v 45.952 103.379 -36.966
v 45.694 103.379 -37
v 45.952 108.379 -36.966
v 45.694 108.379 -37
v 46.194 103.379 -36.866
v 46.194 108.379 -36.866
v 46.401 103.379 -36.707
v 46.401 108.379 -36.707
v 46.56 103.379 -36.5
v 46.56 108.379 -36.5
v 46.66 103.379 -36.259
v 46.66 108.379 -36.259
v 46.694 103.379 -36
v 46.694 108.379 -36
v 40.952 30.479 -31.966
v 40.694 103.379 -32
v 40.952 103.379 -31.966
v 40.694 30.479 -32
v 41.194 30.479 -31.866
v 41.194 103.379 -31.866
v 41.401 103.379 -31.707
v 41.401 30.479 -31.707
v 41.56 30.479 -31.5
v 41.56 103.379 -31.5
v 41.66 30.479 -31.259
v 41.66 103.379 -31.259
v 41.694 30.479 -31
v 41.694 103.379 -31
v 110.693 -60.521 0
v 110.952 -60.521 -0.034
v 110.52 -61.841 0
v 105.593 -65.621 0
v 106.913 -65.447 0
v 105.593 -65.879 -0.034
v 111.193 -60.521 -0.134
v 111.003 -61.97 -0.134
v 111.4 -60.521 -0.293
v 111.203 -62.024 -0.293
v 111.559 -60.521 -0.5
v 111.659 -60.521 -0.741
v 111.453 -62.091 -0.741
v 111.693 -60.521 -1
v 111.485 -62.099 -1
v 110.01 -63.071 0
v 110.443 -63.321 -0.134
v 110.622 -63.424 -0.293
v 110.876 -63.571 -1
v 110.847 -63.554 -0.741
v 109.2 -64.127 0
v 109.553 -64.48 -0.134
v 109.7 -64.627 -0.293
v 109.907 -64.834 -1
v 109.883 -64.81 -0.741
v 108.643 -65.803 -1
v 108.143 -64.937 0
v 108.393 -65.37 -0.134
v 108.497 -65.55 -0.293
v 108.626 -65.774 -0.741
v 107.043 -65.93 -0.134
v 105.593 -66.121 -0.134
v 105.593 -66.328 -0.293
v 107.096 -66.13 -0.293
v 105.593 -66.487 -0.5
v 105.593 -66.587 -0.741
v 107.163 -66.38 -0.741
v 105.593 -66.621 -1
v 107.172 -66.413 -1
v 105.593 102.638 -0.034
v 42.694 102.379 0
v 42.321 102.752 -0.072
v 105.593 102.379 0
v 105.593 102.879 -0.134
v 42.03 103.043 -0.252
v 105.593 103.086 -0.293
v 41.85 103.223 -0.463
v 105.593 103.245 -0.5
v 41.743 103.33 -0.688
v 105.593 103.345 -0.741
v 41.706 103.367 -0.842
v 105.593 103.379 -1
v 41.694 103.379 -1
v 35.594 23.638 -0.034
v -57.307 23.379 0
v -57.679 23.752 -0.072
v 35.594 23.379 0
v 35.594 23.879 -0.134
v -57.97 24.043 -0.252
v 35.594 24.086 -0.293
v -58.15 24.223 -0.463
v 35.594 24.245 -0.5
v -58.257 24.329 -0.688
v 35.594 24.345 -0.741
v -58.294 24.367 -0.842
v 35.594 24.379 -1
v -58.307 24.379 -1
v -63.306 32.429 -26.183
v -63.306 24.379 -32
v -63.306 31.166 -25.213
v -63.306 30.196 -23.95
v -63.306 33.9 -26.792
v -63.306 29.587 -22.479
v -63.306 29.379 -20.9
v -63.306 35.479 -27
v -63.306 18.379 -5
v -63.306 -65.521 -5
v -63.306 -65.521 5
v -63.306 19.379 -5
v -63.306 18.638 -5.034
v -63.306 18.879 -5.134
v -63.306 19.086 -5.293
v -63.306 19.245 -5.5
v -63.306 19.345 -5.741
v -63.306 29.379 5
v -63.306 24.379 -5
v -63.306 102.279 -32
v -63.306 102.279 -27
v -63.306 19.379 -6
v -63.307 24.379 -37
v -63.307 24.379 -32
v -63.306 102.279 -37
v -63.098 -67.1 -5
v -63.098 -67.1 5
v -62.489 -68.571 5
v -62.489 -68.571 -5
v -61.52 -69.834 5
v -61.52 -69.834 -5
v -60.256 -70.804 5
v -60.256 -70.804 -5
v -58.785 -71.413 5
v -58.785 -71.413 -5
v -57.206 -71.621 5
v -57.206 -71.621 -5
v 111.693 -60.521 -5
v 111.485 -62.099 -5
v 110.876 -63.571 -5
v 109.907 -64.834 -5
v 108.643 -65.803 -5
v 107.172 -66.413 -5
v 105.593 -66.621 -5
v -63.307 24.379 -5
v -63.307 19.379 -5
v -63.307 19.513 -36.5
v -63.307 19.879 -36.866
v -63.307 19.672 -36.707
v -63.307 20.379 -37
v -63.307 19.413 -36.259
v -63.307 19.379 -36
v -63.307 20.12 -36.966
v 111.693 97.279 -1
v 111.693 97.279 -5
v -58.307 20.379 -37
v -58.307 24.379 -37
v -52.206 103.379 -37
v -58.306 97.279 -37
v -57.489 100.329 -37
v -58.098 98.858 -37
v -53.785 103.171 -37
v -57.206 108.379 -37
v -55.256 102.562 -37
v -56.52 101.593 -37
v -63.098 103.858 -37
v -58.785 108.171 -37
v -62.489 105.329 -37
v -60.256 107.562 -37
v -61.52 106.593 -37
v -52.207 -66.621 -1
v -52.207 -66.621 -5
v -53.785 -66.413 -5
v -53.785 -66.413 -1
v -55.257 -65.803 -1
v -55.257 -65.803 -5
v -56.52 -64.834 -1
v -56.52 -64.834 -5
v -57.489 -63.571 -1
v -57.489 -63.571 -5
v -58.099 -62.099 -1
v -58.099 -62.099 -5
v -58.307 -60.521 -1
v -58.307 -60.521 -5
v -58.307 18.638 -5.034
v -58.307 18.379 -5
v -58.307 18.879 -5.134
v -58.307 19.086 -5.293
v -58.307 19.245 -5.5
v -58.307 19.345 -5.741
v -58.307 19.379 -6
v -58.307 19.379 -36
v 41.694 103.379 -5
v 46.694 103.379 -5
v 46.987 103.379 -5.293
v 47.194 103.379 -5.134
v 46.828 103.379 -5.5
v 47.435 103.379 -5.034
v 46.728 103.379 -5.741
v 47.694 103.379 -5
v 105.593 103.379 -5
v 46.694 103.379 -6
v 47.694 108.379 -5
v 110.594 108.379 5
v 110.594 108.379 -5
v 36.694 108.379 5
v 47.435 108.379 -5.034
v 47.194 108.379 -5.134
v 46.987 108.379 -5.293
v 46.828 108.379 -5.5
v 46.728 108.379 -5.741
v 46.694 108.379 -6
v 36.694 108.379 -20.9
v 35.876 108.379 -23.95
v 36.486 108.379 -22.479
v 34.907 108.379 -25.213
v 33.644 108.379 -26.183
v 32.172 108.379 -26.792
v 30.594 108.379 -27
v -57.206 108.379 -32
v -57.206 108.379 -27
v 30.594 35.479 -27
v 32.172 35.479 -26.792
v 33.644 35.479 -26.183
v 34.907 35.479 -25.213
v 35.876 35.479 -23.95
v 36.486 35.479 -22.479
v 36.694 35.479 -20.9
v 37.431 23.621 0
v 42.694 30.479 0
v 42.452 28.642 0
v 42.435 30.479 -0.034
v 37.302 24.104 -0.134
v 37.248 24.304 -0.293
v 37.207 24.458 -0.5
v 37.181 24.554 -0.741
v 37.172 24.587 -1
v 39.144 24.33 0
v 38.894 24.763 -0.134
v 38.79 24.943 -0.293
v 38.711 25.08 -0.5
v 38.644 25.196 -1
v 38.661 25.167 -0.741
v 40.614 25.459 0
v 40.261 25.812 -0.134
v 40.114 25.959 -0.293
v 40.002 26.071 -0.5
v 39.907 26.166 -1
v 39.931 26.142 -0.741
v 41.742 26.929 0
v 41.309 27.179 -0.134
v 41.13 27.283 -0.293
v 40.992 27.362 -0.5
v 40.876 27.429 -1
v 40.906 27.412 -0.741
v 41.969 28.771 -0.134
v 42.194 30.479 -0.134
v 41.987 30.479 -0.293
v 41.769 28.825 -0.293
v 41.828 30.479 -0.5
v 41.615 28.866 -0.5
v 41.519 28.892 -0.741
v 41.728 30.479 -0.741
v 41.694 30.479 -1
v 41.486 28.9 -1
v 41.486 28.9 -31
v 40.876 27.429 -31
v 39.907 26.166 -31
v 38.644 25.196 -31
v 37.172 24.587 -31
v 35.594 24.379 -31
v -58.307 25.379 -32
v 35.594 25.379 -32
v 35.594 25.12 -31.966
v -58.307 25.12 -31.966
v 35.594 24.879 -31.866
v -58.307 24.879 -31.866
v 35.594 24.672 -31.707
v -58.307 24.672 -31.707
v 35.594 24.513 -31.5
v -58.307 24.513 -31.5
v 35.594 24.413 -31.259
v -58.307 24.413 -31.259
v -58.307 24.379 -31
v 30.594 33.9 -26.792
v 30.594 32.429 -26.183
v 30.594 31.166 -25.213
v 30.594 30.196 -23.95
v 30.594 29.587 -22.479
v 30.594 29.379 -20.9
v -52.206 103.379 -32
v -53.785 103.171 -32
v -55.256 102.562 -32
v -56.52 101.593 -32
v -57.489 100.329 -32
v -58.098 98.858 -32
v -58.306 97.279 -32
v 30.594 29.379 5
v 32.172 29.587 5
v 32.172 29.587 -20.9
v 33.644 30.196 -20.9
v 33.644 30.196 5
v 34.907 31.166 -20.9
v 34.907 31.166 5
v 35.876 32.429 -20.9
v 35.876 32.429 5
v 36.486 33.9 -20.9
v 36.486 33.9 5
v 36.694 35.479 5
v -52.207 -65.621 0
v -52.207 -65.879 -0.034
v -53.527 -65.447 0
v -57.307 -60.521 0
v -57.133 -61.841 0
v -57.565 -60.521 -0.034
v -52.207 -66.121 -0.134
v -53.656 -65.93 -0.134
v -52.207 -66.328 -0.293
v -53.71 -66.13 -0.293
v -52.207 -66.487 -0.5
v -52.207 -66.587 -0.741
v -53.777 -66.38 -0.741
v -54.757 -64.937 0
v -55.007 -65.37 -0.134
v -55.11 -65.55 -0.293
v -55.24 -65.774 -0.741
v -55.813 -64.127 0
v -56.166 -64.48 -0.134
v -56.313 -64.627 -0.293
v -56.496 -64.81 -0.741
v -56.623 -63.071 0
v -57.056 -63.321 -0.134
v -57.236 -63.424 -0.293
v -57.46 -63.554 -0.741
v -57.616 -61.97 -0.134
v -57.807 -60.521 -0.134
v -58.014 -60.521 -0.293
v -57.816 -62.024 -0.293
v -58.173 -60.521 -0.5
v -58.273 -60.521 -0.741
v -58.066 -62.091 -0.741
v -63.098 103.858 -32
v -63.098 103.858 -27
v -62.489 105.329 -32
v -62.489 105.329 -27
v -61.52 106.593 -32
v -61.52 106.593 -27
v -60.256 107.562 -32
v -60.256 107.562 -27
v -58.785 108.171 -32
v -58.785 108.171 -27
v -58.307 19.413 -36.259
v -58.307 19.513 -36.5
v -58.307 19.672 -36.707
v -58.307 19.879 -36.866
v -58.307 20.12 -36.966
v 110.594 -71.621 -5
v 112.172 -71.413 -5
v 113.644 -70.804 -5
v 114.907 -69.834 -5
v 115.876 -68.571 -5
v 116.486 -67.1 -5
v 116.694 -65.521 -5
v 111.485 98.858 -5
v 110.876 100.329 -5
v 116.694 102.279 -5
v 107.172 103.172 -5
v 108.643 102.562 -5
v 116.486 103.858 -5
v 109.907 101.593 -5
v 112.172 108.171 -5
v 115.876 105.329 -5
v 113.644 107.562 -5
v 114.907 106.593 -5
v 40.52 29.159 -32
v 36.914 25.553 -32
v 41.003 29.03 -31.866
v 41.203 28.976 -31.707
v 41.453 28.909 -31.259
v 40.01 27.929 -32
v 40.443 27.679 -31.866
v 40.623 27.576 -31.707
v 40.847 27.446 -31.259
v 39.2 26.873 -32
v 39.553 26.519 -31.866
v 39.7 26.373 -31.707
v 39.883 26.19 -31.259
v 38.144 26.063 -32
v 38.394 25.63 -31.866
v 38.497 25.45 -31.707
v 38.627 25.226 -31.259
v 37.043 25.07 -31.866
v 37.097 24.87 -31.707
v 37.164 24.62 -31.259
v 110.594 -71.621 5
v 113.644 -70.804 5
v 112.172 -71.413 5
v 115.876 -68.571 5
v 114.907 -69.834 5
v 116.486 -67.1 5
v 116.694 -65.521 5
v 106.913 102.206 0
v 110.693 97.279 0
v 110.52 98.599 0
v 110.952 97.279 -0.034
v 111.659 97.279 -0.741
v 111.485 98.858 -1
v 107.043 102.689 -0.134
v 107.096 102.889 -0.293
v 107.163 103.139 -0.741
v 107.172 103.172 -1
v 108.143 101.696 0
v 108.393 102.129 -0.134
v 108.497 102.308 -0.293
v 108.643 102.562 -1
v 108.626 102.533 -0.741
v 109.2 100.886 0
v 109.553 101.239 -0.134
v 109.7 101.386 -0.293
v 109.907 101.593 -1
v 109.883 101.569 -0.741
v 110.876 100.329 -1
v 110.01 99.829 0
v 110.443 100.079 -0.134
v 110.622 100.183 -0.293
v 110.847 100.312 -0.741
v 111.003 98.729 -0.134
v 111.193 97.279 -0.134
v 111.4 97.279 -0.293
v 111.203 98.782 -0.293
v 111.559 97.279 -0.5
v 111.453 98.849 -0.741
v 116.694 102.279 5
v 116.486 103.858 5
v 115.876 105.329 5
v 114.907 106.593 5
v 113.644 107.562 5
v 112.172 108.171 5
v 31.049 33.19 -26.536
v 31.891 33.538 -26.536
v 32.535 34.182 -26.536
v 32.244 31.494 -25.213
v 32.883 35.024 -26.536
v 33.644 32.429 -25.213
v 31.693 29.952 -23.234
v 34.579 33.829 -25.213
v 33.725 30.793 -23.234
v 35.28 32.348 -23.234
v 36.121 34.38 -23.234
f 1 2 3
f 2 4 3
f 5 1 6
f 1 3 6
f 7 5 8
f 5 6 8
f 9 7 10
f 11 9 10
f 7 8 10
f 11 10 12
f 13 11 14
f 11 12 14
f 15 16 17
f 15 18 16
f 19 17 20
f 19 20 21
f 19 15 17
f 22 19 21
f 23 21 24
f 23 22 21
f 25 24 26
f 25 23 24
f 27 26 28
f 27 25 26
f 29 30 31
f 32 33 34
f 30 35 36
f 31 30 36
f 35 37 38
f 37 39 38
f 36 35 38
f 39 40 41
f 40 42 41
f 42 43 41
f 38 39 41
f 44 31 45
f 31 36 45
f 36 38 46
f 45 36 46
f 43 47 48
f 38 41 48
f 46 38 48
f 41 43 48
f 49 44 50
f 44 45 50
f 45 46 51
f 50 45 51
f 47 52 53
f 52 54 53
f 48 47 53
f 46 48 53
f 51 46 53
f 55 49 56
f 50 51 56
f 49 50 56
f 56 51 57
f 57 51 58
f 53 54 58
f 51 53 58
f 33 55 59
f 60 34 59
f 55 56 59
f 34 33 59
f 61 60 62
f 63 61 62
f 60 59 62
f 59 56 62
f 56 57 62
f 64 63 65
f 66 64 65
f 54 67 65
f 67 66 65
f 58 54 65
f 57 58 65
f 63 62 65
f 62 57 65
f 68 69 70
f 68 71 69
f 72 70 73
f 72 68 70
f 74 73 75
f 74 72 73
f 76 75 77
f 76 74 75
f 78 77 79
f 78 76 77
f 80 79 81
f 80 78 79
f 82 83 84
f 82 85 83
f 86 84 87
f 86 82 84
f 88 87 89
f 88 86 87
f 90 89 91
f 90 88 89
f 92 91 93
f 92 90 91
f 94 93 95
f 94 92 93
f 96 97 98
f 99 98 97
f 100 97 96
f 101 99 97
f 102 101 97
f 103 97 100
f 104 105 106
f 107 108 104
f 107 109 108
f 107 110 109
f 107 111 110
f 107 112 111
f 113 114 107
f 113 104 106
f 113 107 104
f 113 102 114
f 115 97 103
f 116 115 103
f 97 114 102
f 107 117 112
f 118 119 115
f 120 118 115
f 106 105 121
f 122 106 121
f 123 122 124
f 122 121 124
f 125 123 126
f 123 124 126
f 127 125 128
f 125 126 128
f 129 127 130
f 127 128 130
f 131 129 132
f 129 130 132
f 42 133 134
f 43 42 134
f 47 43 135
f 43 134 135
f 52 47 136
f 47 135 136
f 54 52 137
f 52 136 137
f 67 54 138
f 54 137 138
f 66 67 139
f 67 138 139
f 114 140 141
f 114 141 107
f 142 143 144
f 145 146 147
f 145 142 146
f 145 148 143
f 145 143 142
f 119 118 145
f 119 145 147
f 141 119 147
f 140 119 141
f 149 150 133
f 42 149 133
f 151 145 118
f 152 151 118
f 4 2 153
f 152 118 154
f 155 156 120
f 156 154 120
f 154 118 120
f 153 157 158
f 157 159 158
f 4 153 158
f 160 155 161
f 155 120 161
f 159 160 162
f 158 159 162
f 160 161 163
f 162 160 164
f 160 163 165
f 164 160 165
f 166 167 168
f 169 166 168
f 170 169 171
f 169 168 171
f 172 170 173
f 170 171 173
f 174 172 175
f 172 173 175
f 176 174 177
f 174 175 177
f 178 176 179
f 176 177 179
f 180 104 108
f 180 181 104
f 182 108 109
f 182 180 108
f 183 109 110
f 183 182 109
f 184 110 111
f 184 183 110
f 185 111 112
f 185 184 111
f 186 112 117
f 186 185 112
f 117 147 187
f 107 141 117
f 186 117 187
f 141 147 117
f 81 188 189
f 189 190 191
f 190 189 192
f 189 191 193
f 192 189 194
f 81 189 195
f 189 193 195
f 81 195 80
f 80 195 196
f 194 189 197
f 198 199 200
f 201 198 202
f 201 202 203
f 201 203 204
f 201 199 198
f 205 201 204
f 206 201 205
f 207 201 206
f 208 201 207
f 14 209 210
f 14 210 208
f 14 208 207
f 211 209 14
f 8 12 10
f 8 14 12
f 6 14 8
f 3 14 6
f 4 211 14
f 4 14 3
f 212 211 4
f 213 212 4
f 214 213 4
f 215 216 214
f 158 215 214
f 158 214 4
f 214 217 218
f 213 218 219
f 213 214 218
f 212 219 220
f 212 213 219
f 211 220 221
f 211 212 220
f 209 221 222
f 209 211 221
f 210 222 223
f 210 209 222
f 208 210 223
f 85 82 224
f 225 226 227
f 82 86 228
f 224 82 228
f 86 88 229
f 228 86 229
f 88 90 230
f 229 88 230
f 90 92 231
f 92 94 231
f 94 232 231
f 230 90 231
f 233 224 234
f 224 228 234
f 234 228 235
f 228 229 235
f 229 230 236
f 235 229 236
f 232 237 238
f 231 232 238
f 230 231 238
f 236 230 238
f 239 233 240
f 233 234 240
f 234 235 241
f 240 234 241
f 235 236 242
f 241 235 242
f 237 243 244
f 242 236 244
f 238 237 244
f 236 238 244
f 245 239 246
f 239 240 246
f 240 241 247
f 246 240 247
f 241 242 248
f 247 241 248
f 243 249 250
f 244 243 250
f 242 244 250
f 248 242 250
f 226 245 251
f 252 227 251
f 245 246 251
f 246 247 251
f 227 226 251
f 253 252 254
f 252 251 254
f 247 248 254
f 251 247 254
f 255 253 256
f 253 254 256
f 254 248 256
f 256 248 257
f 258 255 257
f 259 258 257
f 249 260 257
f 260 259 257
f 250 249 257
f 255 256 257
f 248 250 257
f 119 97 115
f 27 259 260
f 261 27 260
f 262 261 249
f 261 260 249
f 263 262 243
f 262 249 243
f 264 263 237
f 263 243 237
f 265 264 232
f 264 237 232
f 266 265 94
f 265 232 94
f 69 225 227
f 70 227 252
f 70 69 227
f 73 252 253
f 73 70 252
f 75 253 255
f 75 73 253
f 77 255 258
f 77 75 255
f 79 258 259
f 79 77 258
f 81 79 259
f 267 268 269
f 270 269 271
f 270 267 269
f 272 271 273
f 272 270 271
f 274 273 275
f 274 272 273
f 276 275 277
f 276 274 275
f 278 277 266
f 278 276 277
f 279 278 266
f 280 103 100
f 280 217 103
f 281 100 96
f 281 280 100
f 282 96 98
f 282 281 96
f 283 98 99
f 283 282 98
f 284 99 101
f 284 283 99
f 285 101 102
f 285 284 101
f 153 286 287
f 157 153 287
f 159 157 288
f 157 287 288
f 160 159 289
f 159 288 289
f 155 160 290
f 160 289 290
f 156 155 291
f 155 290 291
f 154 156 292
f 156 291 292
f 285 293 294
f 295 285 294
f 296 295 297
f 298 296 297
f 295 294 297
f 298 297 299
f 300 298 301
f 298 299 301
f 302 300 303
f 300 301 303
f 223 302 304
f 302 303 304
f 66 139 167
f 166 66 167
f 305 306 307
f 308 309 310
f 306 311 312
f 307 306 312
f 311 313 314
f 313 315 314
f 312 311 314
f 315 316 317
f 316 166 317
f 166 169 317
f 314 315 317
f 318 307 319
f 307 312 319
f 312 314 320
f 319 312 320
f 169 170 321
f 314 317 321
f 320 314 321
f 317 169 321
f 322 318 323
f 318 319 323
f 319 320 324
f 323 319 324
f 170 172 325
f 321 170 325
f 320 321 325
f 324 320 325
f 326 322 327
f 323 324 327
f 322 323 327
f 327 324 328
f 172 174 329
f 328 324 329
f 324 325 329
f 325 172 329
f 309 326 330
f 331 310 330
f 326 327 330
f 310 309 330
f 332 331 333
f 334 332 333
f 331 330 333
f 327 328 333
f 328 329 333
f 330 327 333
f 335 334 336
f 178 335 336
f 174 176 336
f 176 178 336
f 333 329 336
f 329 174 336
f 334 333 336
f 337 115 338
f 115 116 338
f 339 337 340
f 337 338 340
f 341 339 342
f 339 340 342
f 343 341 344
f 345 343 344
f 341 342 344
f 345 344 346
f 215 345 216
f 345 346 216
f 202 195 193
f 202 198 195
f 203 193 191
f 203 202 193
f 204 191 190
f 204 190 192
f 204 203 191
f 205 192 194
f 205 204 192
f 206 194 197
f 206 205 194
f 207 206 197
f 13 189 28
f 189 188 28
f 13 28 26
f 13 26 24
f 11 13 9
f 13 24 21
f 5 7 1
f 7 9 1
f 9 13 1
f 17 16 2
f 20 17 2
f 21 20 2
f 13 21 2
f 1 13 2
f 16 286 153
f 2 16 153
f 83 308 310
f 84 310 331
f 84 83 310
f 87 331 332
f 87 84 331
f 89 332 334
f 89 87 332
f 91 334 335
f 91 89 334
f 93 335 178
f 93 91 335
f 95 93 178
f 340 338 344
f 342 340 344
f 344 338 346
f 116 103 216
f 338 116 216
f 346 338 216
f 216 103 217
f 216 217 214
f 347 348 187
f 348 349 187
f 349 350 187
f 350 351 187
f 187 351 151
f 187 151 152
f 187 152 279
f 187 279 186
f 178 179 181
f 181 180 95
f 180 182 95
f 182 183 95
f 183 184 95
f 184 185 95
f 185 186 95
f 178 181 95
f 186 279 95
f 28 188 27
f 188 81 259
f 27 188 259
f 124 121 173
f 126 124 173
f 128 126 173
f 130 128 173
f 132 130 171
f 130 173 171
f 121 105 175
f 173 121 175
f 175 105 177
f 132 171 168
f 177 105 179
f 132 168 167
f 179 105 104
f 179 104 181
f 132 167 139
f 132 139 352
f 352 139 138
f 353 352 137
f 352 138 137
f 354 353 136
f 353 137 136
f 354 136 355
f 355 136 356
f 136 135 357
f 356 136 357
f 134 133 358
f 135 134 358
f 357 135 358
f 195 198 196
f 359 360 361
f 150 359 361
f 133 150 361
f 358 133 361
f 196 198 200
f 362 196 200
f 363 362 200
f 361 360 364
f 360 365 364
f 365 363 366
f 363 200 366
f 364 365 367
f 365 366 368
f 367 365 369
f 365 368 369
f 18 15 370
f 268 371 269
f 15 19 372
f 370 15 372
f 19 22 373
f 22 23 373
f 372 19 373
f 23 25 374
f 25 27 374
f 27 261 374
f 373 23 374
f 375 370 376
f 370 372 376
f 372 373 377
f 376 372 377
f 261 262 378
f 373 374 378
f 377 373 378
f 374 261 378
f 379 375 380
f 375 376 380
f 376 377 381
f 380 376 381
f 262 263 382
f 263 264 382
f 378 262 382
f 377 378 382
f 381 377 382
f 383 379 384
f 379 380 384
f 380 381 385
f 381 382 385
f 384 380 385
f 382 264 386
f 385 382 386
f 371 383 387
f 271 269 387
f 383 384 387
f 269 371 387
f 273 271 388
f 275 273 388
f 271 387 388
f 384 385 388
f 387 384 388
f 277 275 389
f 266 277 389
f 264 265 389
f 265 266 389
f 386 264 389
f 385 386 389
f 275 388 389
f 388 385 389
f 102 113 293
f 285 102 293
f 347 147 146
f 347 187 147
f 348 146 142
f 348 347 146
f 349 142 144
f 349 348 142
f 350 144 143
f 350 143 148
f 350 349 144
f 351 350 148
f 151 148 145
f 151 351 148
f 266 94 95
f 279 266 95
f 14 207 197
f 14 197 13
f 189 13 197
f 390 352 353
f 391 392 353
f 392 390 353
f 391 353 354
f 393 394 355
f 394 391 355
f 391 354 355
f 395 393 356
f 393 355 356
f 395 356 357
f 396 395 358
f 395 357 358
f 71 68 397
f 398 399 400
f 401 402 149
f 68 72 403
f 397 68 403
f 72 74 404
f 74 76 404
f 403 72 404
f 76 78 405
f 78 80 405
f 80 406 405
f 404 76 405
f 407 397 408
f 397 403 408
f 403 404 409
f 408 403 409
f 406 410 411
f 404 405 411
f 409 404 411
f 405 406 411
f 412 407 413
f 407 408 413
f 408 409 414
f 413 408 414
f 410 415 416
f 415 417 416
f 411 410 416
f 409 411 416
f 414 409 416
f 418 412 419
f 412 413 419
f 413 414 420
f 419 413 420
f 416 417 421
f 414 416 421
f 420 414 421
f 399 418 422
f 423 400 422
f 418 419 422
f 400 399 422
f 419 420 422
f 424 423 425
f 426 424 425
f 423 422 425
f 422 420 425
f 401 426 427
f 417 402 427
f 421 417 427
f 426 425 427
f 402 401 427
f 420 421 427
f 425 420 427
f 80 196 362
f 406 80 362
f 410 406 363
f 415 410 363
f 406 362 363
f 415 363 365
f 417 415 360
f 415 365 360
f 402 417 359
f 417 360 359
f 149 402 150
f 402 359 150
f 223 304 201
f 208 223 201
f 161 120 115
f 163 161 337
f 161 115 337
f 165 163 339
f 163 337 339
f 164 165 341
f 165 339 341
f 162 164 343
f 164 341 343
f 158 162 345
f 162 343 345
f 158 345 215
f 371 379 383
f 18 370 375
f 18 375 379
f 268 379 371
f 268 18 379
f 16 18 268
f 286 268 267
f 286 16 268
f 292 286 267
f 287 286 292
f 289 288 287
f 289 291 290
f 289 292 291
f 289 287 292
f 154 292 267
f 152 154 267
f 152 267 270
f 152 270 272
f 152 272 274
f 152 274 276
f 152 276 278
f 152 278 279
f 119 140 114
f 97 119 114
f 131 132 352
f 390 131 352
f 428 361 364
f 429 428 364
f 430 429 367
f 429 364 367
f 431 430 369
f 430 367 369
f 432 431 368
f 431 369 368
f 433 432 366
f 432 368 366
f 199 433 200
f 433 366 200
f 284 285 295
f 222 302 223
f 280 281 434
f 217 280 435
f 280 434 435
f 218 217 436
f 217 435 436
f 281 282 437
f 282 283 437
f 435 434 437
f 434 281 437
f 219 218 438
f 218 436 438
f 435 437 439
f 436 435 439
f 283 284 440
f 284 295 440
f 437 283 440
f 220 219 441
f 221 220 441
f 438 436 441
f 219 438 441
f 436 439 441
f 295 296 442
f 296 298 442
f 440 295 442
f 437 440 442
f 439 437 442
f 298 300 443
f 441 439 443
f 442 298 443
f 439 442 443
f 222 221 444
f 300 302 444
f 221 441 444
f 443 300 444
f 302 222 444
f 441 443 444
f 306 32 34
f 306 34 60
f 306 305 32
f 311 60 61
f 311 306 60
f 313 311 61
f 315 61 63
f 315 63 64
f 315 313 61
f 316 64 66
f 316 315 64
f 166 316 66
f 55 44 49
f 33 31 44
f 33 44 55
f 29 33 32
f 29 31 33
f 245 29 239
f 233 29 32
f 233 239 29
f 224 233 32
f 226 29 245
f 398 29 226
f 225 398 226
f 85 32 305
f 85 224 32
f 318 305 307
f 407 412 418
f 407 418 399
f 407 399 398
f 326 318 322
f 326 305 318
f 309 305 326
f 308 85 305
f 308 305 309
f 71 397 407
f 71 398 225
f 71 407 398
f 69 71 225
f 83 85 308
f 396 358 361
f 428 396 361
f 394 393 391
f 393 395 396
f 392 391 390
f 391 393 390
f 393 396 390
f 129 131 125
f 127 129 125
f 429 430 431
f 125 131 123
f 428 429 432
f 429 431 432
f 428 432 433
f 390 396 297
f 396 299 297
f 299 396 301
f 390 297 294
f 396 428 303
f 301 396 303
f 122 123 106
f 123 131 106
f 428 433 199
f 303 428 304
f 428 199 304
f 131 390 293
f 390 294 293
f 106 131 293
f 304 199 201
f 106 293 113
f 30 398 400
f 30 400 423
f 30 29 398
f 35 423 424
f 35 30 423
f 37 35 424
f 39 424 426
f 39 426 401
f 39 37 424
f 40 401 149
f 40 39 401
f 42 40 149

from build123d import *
from build123d.topology import SkipClean

# Parameters (mm, degrees)
BOSS_EXTRUDE1_DEPTH = 5
BOSS_EXTRUDE2_START = -10
BOSS_EXTRUDE2_DEPTH = 10
SKETCH4_W           = 100
SKETCH4_H           = 79
CUT_EXTRUDE1_DEPTH  = 30
BOSS_EXTRUDE3_DEPTH = 37
SKETCH8_W           = 5
SKETCH8_H           = 79
BOSS_EXTRUDE6_DEPTH = 100
FILLET3_R           = 6.1
FILLET4_R           = 6.1
BOSS_EXTRUDE7_DEPTH = 5
SKETCH10_W          = 5
SKETCH10_H          = 32
BOSS_EXTRUDE8_DEPTH = 5
SKETCH11_W          = 32
SKETCH11_H          = 5
BOSS_EXTRUDE9_DEPTH = 5
FILLET6_R           = 1


with BuildPart() as part:
    # Sketch1 → Boss-Extrude1 (new body)
    with BuildSketch(Plane.XY):
        with BuildLine():
            Line((-57.206320908, 108.379254457), (110.593679092, 108.379254457))
            ThreePointArc((110.593679092, 108.379254457), (114.907030458, 106.592605822), (116.693679092, 102.279254457))
            Line((116.693679092, 102.279254457), (116.693679092, -65.520745543))
            ThreePointArc((116.693679092, -65.520745543), (114.907030458, -69.834096908), (110.593679092, -71.620745543))
            Line((110.593679092, -71.620745543), (-57.206320908, -71.620745543))
            ThreePointArc((-57.206320908, -71.620745543), (-61.519672273, -69.834096908), (-63.306320908, -65.520745543))
            Line((-63.306320908, -65.520745543), (-63.306320908, 102.279254457))
            ThreePointArc((-63.306320908, 102.279254457), (-61.519672273, 106.592605822), (-57.206320908, 108.379254457))
        make_face()
    extrude(amount=BOSS_EXTRUDE1_DEPTH)

    # Sketch3 → Boss-Extrude2 (add)
    with SkipClean():  # the faces are left unmerged after this step: merging them gives an invalid solid
        with BuildSketch(Plane.XY.offset(5).offset(BOSS_EXTRUDE2_START)):
            with BuildLine():
                ThreePointArc((-57.206320908, 108.379254457), (-61.519672273, 106.592605822), (-63.306320908, 102.279254457))
                Line((-63.306320908, 102.279254457), (-63.306320908, -65.520745543))
                ThreePointArc((-63.306320908, -65.520745543), (-61.519672273, -69.834096908), (-57.206320908, -71.620745543))
                Line((-57.206320908, -71.620745543), (110.593679092, -71.620745543))
                ThreePointArc((110.593679092, -71.620745543), (114.907030458, -69.834096908), (116.693679092, -65.520745543))
                Line((116.693679092, -65.520745543), (116.693679092, 102.279254457))
                ThreePointArc((116.693679092, 102.279254457), (114.907030458, 106.592605822), (110.593679092, 108.379254457))
                Line((110.593679092, 108.379254457), (-57.206320908, 108.379254457))
            make_face()
            with BuildLine():
                Line((105.593338585, -66.620625471), (-52.206661415, -66.620625471))
                ThreePointArc((-52.206661415, -66.620625471), (-56.520012781, -64.833976836), (-58.306661415, -60.520625471))
                Line((-58.306661415, -60.520625471), (-58.306661415, 97.279374529))
                ThreePointArc((-58.306661415, 97.279374529), (-56.520012781, 101.592725894), (-52.206661415, 103.379374529))
                Line((-52.206661415, 103.379374529), (105.593338585, 103.379374529))
                ThreePointArc((105.593338585, 103.379374529), (109.90668995, 101.592725894), (111.693338585, 97.279374529))
                Line((111.693338585, 97.279374529), (111.693338585, -60.520625471))
                ThreePointArc((111.693338585, -60.520625471), (109.90668995, -64.833976836), (105.593338585, -66.620625471))
            make_face(mode=Mode.SUBTRACT)
        extrude(amount=BOSS_EXTRUDE2_DEPTH)
    add(part.part.scale(1), mode=Mode.REPLACE)  # the faces are merged on a copy

    # Sketch4 → Cut-Extrude1 (cut, symmetric)
    with BuildSketch(Plane.XY.offset(5)):
        with Locations((-13.306320908, 68.879254457)):
            Rectangle(SKETCH4_W, SKETCH4_H)
    extrude(amount=CUT_EXTRUDE1_DEPTH, both=True, mode=Mode.SUBTRACT)

    # Sketch5 → Boss-Extrude3 (add)
    with BuildSketch(Plane.XY.offset(5)):
        with BuildLine():
            Line((36.693679092, 108.379254457), (41.693679092, 108.379254457))
            Line((41.693679092, 108.379254457), (41.693679092, 30.479254457))
            ThreePointArc((41.693679092, 30.479254457), (39.907030458, 26.165903092), (35.593679092, 24.379254457))
            Line((35.593679092, 24.379254457), (-63.306320908, 24.379254457))
            Line((-63.306320908, 24.379254457), (-63.306320908, 29.379254457))
            Line((-63.306320908, 29.379254457), (30.593679092, 29.379254457))
            ThreePointArc((30.593679092, 29.379254457), (34.907030458, 31.165903092), (36.693679092, 35.479254457))
            Line((36.693679092, 35.479254457), (36.693679092, 108.379254457))
        make_face()
    extrude(amount=-BOSS_EXTRUDE3_DEPTH)

    # Sketch8 → Boss-Extrude6 (add)
    with BuildSketch(Plane.ZY.offset(-36.693679092)):
        with Locations((-29.5, 68.879254457)):
            Rectangle(SKETCH8_W, SKETCH8_H)
    extrude(amount=BOSS_EXTRUDE6_DEPTH)

    # Fillet3
    fillet3_edges = [part.edges().sort_by_distance(p)[0] for p in [
        (-63.306320908, 108.379254457, -29.5),
    ]]
    fillet(fillet3_edges, radius=FILLET3_R)

    # Fillet4
    fillet4_edges = [part.edges().sort_by_distance(p)[0] for p in [
        (34.907030458, 31.165903092, -27),
        (36.693679092, 71.929254457, -27),
        (-16.356320908, 29.379254457, -27),
    ]]
    fillet(fillet4_edges, radius=FILLET4_R)

    # Sketch9 → Boss-Extrude7 (add)
    with BuildSketch(Plane(origin=(0, 0, -32), x_dir=(-1, 0, 0), z_dir=(0, 0, -1))):
        with BuildLine():
            Line((-41.693679092, 103.379254457), (52.206342763, 103.379254457))
            ThreePointArc((52.206342763, 103.379254457), (56.519684701, 101.592615249), (58.306342763, 97.279281121))
            Line((58.306342763, 97.279281121), (58.306661415, 24.379254457))
            Line((58.306661415, 24.379254457), (63.306661415, 24.379254457))
            Line((63.306661415, 24.379254457), (63.306320908, 102.279254457))
            ThreePointArc((63.306320908, 102.279254457), (61.519672273, 106.592605822), (57.206320908, 108.379254457))
            Line((57.206320908, 108.379254457), (-41.693679092, 108.379254457))
            Line((-41.693679092, 108.379254457), (-41.693679092, 103.379254457))
        make_face()
    extrude(amount=BOSS_EXTRUDE7_DEPTH)

    # Sketch10 → Boss-Extrude8 (add)
    with BuildSketch(Plane.XZ.offset(-24.379254457)):
        with Locations((-60.806661415, -21)):
            Rectangle(SKETCH10_W, SKETCH10_H)
    extrude(amount=BOSS_EXTRUDE8_DEPTH)

    # Sketch11 → Boss-Extrude9 (add)
    with BuildSketch(Plane(origin=(41.693679092, 0, 0), x_dir=(0, 0, -1), z_dir=(1, 0, 0))):
        with Locations((21, 105.879254457)):
            Rectangle(SKETCH11_W, SKETCH11_H)
    extrude(amount=BOSS_EXTRUDE9_DEPTH)

    # Fillet6
    fillet6_edges = [part.edges().sort_by_distance(p)[0] for p in [
        (73.643508838, 103.379374529, 0),
        (-11.356491162, 24.379254457, 0),
        (39.907030458, 26.165903092, 0),
        (41.693679092, 66.929314493, 0),
        (41.693679092, 66.929254457, -32),
        (39.907030458, 26.165903092, -32),
        (-11.356491162, 24.379254457, -32),
        (-60.806661415, 19.379254457, -37),
        (-60.806491162, 19.379254457, -5),
        (-58.306661415, -18.070685507, 0),
        (46.693679092, 105.879254457, -37),
        (46.693679092, 105.879314493, -5),
        (109.90668995, 101.592725894, 0),
        (111.693338585, 18.379374529, 0),
        (109.90668995, -64.833976836, 0),
        (26.693338585, -66.620625471, 0),
        (-56.520012781, -64.833976836, 0),
    ]]
    fillet(fillet6_edges, radius=FILLET6_R)


solid = part.part
